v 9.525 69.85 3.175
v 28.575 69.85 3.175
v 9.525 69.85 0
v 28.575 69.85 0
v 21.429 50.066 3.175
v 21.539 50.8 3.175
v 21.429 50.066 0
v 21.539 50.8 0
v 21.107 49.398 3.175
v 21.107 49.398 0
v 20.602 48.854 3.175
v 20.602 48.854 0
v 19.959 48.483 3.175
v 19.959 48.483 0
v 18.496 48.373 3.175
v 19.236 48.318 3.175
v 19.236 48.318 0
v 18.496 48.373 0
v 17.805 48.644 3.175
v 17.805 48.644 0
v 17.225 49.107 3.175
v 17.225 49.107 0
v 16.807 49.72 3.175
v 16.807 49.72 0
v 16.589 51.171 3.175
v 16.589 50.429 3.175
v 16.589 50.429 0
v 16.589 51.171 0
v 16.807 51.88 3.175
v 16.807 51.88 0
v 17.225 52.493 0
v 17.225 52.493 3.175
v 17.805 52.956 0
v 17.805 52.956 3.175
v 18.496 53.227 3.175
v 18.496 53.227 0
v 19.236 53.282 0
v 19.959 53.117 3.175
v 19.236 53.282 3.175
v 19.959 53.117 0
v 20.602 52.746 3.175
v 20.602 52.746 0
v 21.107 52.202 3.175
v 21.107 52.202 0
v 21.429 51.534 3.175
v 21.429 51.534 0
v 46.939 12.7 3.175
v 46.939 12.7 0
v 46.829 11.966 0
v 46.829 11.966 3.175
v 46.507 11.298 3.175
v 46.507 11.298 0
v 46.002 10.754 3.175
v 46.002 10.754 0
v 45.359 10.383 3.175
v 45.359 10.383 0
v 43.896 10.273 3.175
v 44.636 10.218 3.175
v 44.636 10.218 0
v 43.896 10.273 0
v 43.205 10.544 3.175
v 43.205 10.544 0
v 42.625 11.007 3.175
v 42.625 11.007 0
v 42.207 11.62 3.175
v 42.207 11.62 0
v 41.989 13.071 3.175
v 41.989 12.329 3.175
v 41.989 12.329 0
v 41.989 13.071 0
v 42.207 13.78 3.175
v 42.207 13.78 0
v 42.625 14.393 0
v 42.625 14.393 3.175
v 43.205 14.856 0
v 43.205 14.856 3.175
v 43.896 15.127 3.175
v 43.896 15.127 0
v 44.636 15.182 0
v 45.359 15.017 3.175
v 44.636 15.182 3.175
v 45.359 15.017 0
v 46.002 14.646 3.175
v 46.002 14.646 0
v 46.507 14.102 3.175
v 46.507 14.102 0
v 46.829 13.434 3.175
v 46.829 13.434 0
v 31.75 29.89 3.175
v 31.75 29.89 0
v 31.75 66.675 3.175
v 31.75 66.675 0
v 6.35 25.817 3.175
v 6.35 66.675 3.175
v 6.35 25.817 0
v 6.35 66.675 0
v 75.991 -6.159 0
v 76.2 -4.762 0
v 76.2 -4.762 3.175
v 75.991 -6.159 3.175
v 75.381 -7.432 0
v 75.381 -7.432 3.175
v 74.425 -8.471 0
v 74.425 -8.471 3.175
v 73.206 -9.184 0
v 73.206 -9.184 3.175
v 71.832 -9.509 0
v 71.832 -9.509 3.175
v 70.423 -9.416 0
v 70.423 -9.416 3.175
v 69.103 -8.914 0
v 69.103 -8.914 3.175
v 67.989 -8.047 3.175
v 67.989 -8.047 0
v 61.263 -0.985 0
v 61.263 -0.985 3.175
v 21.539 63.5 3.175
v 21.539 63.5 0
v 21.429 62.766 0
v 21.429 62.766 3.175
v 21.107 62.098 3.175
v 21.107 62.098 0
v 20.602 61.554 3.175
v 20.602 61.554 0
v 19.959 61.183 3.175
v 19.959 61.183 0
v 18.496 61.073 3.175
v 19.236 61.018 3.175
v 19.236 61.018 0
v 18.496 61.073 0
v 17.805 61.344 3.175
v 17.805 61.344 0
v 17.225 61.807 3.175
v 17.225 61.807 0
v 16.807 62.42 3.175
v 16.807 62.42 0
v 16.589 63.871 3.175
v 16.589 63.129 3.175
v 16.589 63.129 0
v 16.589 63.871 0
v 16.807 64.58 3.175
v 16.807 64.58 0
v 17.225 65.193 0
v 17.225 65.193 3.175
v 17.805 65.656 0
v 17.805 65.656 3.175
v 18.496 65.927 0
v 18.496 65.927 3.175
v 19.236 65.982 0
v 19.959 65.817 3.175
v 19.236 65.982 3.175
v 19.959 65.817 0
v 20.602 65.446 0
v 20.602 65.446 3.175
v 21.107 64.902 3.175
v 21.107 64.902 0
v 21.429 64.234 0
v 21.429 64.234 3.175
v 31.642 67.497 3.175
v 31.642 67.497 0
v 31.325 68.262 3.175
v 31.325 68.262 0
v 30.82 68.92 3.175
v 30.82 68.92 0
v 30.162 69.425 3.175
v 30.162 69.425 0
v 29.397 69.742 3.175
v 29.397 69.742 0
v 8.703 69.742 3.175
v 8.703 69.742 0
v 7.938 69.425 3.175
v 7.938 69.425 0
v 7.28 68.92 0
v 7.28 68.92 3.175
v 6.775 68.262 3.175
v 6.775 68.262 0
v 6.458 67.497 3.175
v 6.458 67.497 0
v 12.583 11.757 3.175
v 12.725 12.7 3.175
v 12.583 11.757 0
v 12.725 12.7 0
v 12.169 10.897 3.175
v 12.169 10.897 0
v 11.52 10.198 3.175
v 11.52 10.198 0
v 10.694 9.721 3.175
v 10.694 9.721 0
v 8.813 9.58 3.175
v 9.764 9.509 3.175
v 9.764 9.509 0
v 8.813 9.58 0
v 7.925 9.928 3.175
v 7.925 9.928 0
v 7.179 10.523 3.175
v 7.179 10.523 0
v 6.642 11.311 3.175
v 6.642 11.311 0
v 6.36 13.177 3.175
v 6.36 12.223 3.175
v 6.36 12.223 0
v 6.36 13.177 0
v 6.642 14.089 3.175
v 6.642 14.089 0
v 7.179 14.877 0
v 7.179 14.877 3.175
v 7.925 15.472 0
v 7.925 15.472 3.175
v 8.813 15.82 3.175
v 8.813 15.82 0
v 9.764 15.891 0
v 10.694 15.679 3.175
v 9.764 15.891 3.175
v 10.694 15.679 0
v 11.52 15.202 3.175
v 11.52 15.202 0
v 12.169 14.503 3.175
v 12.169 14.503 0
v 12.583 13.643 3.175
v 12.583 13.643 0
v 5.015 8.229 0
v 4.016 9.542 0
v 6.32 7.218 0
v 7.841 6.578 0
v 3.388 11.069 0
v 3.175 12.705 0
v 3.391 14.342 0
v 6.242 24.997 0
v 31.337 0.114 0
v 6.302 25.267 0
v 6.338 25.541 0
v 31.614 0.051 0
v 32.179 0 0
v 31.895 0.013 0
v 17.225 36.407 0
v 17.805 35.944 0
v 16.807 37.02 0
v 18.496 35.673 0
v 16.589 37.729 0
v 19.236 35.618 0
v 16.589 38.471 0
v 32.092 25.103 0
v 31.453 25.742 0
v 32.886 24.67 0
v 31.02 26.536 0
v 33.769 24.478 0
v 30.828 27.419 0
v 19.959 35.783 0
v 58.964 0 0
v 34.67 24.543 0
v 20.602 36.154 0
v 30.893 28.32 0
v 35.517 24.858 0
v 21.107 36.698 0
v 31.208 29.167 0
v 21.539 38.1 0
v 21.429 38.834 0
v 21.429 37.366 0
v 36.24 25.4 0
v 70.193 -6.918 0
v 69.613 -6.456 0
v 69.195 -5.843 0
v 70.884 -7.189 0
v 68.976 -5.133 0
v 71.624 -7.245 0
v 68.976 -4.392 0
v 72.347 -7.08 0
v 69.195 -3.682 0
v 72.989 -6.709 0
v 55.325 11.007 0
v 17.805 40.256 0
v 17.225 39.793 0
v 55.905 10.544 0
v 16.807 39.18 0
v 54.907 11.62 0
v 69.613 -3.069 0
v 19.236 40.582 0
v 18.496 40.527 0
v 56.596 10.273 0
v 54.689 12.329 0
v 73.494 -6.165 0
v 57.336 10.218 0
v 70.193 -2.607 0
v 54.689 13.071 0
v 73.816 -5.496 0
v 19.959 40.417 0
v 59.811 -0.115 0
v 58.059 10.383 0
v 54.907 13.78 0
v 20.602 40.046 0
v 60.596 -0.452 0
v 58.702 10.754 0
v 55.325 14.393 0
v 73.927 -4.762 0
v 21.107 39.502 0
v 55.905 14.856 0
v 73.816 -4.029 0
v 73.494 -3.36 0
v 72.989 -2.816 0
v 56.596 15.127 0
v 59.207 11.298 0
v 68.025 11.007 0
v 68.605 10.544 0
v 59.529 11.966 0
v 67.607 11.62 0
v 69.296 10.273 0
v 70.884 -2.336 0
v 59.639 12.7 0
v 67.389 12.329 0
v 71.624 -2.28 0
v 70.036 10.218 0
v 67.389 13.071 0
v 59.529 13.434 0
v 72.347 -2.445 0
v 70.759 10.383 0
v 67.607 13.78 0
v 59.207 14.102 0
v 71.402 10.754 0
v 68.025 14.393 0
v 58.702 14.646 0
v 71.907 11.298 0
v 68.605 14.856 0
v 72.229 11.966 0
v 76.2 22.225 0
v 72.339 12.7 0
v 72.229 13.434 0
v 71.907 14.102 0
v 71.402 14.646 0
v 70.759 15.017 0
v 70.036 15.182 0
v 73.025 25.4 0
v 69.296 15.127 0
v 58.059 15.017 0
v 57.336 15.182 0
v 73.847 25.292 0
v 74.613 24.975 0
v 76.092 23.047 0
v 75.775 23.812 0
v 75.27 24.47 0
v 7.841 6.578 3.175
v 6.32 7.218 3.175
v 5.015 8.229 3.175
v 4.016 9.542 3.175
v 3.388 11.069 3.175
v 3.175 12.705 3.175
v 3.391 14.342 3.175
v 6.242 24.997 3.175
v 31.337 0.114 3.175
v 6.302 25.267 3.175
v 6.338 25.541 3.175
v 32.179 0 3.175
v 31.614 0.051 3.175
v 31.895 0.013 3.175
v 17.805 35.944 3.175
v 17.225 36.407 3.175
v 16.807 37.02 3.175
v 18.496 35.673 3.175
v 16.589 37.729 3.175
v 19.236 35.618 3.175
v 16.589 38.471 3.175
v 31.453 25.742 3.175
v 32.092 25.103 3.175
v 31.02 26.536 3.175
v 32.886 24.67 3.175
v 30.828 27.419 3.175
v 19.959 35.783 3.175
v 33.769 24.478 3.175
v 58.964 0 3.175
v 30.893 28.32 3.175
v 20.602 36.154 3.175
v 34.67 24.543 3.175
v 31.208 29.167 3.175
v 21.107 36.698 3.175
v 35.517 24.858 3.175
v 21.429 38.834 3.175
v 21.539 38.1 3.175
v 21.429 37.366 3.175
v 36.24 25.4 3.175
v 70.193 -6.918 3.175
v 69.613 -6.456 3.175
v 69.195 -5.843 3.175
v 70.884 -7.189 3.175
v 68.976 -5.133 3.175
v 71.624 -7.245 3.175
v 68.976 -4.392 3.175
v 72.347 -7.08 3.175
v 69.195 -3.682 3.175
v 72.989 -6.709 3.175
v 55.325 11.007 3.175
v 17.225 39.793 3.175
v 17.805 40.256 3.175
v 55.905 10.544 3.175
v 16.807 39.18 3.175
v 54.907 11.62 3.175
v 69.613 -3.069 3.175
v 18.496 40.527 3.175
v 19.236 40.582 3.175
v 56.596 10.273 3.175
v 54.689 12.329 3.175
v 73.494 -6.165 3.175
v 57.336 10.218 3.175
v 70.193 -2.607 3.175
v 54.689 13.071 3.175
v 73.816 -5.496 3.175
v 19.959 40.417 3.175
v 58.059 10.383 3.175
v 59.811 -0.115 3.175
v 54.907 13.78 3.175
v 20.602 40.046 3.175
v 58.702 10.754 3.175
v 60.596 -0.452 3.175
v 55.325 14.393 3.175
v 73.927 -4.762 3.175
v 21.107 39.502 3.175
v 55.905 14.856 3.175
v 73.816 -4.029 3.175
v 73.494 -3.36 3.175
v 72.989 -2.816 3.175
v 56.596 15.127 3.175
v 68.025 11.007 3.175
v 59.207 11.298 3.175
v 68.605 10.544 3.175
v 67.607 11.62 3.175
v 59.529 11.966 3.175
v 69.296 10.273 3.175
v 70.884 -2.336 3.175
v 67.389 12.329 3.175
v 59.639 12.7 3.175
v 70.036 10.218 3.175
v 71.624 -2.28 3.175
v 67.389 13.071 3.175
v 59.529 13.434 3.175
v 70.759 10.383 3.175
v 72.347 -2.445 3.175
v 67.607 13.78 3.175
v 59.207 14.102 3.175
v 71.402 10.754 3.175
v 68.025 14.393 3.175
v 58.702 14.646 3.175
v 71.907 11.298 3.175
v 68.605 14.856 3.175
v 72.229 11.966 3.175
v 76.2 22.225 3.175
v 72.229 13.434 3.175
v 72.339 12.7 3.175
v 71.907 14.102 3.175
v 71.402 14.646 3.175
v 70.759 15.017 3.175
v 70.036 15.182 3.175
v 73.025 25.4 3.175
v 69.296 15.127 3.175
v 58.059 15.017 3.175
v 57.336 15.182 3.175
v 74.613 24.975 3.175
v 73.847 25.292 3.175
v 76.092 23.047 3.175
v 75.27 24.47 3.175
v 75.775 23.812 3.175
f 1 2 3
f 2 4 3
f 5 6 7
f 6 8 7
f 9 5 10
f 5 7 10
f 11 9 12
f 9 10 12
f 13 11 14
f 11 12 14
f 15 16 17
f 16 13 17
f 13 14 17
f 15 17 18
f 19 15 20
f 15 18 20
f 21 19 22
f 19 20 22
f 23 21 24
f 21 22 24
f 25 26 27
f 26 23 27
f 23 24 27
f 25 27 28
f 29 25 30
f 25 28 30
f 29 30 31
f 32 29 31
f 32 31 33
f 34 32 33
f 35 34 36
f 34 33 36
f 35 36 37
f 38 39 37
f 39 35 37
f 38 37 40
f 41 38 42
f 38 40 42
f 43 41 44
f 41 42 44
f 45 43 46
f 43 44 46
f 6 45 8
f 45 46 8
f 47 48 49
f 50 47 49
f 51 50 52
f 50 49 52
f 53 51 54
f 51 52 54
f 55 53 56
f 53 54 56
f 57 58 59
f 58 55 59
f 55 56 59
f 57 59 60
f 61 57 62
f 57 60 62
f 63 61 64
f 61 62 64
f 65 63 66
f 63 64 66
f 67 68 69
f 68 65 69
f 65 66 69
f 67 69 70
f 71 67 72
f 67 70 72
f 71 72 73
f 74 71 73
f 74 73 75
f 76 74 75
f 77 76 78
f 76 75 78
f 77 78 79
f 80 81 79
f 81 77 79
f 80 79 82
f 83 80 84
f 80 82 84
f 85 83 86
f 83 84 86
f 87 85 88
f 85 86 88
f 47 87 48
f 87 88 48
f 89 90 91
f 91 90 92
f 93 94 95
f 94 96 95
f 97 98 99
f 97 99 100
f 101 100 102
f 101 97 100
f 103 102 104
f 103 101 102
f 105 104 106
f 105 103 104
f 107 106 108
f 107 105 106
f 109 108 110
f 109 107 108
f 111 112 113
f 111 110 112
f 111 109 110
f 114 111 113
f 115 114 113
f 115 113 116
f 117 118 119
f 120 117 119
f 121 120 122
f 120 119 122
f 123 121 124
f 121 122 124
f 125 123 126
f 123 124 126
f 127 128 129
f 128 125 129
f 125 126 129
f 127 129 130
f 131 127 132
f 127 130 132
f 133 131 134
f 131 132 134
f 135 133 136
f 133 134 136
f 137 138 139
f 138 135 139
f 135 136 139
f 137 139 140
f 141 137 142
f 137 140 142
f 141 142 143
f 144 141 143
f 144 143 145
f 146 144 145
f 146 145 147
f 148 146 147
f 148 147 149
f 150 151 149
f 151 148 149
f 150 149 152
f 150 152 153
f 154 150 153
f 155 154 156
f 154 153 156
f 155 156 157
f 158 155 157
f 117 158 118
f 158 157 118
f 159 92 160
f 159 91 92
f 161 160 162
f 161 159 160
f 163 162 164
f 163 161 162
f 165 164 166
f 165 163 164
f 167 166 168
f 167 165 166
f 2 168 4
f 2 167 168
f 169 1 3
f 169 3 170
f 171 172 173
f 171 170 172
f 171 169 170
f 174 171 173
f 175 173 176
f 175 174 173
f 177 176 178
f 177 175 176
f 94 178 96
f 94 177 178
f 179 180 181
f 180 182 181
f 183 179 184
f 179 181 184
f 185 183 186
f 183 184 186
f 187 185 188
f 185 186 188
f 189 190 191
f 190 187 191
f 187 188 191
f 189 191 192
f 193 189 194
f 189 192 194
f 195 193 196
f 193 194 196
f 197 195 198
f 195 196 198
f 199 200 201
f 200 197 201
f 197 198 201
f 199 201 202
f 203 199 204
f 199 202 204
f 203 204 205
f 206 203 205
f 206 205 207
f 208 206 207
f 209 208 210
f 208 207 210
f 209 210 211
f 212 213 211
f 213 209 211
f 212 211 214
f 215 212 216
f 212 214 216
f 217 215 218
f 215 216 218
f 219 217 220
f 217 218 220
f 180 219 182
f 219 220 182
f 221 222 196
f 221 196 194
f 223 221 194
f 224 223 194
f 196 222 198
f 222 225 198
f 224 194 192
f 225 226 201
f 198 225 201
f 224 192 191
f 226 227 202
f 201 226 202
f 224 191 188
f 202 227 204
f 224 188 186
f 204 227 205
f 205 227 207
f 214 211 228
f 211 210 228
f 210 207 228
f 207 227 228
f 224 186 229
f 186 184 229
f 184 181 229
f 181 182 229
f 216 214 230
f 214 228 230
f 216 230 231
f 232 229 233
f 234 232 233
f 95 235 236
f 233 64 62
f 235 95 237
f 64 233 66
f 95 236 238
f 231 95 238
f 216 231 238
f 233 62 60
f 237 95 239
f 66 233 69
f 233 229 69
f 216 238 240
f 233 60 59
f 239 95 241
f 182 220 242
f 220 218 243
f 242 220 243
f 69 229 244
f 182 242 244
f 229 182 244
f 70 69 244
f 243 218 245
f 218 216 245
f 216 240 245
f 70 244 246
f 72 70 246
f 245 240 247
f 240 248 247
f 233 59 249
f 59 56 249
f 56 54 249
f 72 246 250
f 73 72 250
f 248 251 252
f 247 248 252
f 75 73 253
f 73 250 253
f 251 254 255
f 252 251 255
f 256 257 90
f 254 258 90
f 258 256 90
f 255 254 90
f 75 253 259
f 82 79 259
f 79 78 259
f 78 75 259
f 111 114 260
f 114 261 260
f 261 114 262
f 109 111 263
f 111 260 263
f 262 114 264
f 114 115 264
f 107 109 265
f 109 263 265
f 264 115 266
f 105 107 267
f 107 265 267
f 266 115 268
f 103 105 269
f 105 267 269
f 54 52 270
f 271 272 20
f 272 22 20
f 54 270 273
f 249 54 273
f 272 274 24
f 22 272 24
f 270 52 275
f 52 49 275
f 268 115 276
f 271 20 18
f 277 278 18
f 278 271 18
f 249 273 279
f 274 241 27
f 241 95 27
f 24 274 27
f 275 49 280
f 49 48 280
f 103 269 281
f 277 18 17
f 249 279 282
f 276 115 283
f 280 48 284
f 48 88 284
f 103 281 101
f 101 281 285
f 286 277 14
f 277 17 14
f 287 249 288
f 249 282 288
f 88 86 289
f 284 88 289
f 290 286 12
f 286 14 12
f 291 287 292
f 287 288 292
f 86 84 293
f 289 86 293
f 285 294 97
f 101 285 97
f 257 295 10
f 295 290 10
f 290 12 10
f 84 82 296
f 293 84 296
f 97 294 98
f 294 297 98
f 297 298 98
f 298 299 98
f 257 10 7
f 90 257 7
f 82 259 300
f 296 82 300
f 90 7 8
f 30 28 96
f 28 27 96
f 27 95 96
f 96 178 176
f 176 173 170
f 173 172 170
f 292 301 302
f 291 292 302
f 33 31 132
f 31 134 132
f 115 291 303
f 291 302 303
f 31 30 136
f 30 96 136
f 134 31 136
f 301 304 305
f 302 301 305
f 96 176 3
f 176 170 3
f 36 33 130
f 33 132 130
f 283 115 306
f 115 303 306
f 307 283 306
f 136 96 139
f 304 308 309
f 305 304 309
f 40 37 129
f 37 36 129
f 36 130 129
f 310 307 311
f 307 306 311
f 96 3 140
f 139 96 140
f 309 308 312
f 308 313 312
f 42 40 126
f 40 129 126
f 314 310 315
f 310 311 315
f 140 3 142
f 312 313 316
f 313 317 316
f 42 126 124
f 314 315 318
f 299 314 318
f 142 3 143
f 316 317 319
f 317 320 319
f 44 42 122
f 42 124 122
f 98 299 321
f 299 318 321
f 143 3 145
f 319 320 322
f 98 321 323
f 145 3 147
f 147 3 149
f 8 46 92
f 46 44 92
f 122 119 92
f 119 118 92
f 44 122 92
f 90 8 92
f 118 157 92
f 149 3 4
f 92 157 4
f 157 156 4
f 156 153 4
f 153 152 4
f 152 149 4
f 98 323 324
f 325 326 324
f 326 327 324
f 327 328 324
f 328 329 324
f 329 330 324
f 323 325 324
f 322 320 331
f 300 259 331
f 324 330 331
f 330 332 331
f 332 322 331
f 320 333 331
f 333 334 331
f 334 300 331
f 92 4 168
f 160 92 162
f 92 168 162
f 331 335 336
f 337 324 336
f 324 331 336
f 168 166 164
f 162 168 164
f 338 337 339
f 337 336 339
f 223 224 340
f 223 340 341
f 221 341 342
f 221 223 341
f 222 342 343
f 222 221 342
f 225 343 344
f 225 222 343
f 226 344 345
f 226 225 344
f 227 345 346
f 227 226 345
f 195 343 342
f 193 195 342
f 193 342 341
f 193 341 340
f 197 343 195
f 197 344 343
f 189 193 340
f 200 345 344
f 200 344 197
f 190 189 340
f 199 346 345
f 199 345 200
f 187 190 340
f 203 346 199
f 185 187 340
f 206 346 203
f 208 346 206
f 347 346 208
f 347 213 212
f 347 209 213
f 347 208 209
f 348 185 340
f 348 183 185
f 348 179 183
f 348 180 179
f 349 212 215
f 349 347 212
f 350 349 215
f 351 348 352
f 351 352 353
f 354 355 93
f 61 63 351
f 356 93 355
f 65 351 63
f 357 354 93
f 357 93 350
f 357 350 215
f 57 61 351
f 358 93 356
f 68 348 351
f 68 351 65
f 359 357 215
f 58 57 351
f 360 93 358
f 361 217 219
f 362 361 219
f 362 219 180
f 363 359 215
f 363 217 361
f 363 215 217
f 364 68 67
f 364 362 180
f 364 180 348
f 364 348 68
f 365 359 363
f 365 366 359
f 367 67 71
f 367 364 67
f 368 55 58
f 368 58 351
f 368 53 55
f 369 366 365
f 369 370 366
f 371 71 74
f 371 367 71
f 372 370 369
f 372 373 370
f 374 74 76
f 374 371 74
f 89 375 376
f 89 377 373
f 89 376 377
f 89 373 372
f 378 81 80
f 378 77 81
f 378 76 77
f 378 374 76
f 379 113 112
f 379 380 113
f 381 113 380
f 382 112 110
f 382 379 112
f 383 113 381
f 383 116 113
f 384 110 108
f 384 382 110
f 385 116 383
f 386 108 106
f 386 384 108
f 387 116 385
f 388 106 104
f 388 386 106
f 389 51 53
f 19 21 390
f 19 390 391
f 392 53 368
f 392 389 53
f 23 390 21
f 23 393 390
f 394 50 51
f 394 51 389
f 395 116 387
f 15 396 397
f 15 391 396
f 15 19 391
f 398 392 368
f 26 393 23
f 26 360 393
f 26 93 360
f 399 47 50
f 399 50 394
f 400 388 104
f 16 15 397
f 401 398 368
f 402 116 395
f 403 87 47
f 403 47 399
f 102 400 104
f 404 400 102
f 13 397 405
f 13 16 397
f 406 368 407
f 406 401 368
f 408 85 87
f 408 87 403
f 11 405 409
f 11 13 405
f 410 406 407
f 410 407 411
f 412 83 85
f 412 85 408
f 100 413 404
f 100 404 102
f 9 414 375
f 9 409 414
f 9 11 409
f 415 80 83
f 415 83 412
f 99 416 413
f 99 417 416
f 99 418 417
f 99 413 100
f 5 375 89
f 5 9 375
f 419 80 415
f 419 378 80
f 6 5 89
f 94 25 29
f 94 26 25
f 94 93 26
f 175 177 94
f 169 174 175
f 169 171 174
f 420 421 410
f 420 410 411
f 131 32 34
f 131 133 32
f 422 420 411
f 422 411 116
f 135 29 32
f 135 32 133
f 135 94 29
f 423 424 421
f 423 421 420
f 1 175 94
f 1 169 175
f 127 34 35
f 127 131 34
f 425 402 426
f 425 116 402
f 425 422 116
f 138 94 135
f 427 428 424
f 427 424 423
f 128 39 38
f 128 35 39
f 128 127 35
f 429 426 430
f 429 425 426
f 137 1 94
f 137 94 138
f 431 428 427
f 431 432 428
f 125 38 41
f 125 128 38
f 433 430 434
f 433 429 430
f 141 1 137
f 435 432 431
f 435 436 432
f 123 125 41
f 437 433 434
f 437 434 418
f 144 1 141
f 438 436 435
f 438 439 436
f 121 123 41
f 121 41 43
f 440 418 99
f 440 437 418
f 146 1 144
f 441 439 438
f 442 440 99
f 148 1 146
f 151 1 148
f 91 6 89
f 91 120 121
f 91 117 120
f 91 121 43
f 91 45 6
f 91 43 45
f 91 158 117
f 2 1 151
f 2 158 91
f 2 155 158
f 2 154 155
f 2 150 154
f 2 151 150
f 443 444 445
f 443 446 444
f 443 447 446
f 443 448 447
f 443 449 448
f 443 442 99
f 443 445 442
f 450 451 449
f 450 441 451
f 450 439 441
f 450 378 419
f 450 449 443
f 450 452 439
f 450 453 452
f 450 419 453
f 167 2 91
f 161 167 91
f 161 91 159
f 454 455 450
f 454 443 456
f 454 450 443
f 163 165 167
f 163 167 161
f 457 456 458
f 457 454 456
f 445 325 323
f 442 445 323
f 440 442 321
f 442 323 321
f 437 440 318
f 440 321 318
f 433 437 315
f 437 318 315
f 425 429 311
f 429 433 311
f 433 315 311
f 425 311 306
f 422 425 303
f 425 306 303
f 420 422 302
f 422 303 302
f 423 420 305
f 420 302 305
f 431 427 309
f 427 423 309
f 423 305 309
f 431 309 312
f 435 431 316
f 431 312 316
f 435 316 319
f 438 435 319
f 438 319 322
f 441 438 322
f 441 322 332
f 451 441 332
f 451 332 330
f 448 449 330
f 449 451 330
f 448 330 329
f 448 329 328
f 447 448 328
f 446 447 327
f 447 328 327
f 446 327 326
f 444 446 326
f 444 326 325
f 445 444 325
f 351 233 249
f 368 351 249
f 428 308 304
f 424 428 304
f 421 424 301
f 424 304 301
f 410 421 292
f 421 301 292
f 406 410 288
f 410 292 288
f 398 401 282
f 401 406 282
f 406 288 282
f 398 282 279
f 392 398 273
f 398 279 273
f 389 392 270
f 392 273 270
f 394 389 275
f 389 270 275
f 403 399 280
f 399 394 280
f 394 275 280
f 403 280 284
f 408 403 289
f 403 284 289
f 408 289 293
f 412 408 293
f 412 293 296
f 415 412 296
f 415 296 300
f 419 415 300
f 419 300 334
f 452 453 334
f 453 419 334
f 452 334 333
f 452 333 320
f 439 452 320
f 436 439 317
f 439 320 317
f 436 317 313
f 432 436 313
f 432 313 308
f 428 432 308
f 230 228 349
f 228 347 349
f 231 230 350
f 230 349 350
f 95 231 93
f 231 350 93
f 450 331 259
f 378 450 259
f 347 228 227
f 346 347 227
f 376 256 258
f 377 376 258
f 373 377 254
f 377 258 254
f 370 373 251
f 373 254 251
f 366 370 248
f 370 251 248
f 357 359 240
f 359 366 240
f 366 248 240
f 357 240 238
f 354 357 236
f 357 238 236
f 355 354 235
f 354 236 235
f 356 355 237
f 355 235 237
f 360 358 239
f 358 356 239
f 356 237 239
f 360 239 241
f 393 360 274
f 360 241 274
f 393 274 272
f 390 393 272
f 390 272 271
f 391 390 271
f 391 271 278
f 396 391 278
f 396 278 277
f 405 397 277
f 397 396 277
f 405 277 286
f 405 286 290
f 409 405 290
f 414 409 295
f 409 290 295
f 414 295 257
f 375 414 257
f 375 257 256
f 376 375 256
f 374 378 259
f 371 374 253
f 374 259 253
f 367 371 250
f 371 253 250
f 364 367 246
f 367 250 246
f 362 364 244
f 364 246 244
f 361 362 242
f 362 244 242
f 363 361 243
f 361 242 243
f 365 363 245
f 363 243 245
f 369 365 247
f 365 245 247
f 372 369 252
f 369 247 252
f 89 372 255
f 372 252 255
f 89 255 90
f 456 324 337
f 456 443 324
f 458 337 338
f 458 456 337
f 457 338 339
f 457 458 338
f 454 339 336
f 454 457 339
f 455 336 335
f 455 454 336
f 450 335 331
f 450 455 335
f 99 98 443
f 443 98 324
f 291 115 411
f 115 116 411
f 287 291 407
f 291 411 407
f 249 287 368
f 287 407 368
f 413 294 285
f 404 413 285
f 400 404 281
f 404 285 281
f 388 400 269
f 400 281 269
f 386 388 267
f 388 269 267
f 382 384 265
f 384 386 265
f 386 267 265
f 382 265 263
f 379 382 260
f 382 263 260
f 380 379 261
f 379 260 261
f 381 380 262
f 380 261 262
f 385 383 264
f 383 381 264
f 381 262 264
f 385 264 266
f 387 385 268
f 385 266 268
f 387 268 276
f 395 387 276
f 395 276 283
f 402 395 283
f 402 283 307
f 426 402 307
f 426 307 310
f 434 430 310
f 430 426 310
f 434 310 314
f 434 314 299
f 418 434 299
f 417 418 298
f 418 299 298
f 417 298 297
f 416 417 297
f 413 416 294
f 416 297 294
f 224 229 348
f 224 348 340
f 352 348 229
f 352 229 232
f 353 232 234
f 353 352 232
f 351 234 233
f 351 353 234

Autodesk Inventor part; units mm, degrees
ref_plane "YZ Plane" through (0, 0, 0) normal (1, 0, 0) x (0, 1, 0)
ref_plane "XZ Plane" through (0, 0, 0) normal (0, 1, 0) x (-1, 0, 0)
ref_plane "XY Plane" through (0, 0, 0) normal (0, 0, 1) x (1, 0, 0)
sketch "Sketch1" plane through (0, 0, 0) normal (0, 0, 1) x (1, 0, 0)
  line L0 (0, 0) -> (0, 13.4062) construction
  line L1 (0, 0) -> (20.3742, 0) construction
  circle A0 centre (9.525, 12.7) radius 9.525 construction
  circle A1 centre (9.525, 12.7) radius 3.2004
  arc A2 (3.3908, 14.3415) -> (7.8407, 6.5775) centre (9.525, 12.7) ccw
  line L2 (31.75, 0) -> (76.2, 0)
  line L3 (76.2, 0) -> (76.2, 25.4)
  line L4 (76.2, 25.4) -> (31.75, 25.4)
  line L5 (31.75, 25.4) -> (31.75, 31.75)
  line L6 (31.75, 31.75) -> (31.75, 31.75)
  line L7 (31.75, 31.75) -> (31.75, 69.85)
  line L8 (31.75, 69.85) -> (6.35, 69.85)
  line L9 (6.35, 69.85) -> (6.35, 25.4)
  line L10 (6.35, 25.4) -> (3.3908, 14.3415)
  circle A3 centre (19.05, 63.5) radius 2.4892
  circle A4 centre (19.05, 50.8) radius 2.4892
  circle A5 centre (19.05, 38.1) radius 2.4892
  circle A6 centre (44.45, 12.7) radius 2.4892
  circle A7 centre (57.15, 12.7) radius 2.4892
  circle A8 centre (69.85, 12.7) radius 2.4892
  line L11 (31.75, 31.75) -> (31.75, 25.4)
  line L12 (31.75, 25.4) -> (31.75, 25.4)
  line L13 (31.75, 0) -> (7.8407, 6.5775)
  arc A9 (67.9888, -8.047) -> (76.2, -4.7625) centre (71.4375, -4.7625) ccw
  circle A10 centre (71.4375, -4.7625) radius 2.4892
  line L14 (76.2, -4.7625) -> (76.2, 0)
  line L15 (67.9888, -8.047) -> (60.325, 0)
  arc A11 (31.75, 29.8901) -> (36.2401, 25.4) centre (33.9951, 27.6451) ccw
  circle A12 centre (31.2871, 27.4957) radius 0.4629 construction
  circle A13 centre (33.8457, 24.9371) radius 0.4629 construction
  line L16 (31.2871, 27.4957) -> (31.75, 25.4) construction
  line L17 (31.75, 25.4) -> (33.8457, 24.9371) construction
  point P0 (76.2, 12.7)
  point P1 (19.05, 69.85)
  dimension "d0" = 19.05
  dimension "d2" = 6.4008
  dimension "d6" = 12.7
  dimension "d7" = 25.4
  dimension "d8" = 4.9784
  dimension "d11" = 12.7
  dimension "d16" = 6.35
  dimension "d17" = 25.4
  dimension "d19" = 6.35
  dimension "d20" = 12.7
  dimension "d21" = 6.35
  dimension "d24" = 12.7
  dimension "d29" = 6.35
  dimension "d30" = 12.7
  dimension "d35" = 25.4
  dimension "d36" = 9.525
  dimension "d37" = 4.9784
  dimension "d38" = 3.175
  dimension "d39" = 15.875
  dimension "d40" = 6.35
extrude "Extrusion1" add sketch "Sketch1" along normal blind 3.175 contours L10 L9 L8 L7 L5 A11 L4 L3 L2 L13 A2 | L2 L14 A9 L15
fillet "Fillet1" radius 3.175 6 edges at (6.35, 69.85, 1.5875) (31.75, 69.85, 1.5875) (76.2, 25.4, 1.5875) (6.35, 25.4, 1.5875) (31.75, 0, 1.5875) (60.325, 0, 1.5875)
equation "\"d24\" = d11"
properties part number "Bottom Bearing Plate Final (R4A - 0.25in Between Stages)" material "Aluminum 6061"
